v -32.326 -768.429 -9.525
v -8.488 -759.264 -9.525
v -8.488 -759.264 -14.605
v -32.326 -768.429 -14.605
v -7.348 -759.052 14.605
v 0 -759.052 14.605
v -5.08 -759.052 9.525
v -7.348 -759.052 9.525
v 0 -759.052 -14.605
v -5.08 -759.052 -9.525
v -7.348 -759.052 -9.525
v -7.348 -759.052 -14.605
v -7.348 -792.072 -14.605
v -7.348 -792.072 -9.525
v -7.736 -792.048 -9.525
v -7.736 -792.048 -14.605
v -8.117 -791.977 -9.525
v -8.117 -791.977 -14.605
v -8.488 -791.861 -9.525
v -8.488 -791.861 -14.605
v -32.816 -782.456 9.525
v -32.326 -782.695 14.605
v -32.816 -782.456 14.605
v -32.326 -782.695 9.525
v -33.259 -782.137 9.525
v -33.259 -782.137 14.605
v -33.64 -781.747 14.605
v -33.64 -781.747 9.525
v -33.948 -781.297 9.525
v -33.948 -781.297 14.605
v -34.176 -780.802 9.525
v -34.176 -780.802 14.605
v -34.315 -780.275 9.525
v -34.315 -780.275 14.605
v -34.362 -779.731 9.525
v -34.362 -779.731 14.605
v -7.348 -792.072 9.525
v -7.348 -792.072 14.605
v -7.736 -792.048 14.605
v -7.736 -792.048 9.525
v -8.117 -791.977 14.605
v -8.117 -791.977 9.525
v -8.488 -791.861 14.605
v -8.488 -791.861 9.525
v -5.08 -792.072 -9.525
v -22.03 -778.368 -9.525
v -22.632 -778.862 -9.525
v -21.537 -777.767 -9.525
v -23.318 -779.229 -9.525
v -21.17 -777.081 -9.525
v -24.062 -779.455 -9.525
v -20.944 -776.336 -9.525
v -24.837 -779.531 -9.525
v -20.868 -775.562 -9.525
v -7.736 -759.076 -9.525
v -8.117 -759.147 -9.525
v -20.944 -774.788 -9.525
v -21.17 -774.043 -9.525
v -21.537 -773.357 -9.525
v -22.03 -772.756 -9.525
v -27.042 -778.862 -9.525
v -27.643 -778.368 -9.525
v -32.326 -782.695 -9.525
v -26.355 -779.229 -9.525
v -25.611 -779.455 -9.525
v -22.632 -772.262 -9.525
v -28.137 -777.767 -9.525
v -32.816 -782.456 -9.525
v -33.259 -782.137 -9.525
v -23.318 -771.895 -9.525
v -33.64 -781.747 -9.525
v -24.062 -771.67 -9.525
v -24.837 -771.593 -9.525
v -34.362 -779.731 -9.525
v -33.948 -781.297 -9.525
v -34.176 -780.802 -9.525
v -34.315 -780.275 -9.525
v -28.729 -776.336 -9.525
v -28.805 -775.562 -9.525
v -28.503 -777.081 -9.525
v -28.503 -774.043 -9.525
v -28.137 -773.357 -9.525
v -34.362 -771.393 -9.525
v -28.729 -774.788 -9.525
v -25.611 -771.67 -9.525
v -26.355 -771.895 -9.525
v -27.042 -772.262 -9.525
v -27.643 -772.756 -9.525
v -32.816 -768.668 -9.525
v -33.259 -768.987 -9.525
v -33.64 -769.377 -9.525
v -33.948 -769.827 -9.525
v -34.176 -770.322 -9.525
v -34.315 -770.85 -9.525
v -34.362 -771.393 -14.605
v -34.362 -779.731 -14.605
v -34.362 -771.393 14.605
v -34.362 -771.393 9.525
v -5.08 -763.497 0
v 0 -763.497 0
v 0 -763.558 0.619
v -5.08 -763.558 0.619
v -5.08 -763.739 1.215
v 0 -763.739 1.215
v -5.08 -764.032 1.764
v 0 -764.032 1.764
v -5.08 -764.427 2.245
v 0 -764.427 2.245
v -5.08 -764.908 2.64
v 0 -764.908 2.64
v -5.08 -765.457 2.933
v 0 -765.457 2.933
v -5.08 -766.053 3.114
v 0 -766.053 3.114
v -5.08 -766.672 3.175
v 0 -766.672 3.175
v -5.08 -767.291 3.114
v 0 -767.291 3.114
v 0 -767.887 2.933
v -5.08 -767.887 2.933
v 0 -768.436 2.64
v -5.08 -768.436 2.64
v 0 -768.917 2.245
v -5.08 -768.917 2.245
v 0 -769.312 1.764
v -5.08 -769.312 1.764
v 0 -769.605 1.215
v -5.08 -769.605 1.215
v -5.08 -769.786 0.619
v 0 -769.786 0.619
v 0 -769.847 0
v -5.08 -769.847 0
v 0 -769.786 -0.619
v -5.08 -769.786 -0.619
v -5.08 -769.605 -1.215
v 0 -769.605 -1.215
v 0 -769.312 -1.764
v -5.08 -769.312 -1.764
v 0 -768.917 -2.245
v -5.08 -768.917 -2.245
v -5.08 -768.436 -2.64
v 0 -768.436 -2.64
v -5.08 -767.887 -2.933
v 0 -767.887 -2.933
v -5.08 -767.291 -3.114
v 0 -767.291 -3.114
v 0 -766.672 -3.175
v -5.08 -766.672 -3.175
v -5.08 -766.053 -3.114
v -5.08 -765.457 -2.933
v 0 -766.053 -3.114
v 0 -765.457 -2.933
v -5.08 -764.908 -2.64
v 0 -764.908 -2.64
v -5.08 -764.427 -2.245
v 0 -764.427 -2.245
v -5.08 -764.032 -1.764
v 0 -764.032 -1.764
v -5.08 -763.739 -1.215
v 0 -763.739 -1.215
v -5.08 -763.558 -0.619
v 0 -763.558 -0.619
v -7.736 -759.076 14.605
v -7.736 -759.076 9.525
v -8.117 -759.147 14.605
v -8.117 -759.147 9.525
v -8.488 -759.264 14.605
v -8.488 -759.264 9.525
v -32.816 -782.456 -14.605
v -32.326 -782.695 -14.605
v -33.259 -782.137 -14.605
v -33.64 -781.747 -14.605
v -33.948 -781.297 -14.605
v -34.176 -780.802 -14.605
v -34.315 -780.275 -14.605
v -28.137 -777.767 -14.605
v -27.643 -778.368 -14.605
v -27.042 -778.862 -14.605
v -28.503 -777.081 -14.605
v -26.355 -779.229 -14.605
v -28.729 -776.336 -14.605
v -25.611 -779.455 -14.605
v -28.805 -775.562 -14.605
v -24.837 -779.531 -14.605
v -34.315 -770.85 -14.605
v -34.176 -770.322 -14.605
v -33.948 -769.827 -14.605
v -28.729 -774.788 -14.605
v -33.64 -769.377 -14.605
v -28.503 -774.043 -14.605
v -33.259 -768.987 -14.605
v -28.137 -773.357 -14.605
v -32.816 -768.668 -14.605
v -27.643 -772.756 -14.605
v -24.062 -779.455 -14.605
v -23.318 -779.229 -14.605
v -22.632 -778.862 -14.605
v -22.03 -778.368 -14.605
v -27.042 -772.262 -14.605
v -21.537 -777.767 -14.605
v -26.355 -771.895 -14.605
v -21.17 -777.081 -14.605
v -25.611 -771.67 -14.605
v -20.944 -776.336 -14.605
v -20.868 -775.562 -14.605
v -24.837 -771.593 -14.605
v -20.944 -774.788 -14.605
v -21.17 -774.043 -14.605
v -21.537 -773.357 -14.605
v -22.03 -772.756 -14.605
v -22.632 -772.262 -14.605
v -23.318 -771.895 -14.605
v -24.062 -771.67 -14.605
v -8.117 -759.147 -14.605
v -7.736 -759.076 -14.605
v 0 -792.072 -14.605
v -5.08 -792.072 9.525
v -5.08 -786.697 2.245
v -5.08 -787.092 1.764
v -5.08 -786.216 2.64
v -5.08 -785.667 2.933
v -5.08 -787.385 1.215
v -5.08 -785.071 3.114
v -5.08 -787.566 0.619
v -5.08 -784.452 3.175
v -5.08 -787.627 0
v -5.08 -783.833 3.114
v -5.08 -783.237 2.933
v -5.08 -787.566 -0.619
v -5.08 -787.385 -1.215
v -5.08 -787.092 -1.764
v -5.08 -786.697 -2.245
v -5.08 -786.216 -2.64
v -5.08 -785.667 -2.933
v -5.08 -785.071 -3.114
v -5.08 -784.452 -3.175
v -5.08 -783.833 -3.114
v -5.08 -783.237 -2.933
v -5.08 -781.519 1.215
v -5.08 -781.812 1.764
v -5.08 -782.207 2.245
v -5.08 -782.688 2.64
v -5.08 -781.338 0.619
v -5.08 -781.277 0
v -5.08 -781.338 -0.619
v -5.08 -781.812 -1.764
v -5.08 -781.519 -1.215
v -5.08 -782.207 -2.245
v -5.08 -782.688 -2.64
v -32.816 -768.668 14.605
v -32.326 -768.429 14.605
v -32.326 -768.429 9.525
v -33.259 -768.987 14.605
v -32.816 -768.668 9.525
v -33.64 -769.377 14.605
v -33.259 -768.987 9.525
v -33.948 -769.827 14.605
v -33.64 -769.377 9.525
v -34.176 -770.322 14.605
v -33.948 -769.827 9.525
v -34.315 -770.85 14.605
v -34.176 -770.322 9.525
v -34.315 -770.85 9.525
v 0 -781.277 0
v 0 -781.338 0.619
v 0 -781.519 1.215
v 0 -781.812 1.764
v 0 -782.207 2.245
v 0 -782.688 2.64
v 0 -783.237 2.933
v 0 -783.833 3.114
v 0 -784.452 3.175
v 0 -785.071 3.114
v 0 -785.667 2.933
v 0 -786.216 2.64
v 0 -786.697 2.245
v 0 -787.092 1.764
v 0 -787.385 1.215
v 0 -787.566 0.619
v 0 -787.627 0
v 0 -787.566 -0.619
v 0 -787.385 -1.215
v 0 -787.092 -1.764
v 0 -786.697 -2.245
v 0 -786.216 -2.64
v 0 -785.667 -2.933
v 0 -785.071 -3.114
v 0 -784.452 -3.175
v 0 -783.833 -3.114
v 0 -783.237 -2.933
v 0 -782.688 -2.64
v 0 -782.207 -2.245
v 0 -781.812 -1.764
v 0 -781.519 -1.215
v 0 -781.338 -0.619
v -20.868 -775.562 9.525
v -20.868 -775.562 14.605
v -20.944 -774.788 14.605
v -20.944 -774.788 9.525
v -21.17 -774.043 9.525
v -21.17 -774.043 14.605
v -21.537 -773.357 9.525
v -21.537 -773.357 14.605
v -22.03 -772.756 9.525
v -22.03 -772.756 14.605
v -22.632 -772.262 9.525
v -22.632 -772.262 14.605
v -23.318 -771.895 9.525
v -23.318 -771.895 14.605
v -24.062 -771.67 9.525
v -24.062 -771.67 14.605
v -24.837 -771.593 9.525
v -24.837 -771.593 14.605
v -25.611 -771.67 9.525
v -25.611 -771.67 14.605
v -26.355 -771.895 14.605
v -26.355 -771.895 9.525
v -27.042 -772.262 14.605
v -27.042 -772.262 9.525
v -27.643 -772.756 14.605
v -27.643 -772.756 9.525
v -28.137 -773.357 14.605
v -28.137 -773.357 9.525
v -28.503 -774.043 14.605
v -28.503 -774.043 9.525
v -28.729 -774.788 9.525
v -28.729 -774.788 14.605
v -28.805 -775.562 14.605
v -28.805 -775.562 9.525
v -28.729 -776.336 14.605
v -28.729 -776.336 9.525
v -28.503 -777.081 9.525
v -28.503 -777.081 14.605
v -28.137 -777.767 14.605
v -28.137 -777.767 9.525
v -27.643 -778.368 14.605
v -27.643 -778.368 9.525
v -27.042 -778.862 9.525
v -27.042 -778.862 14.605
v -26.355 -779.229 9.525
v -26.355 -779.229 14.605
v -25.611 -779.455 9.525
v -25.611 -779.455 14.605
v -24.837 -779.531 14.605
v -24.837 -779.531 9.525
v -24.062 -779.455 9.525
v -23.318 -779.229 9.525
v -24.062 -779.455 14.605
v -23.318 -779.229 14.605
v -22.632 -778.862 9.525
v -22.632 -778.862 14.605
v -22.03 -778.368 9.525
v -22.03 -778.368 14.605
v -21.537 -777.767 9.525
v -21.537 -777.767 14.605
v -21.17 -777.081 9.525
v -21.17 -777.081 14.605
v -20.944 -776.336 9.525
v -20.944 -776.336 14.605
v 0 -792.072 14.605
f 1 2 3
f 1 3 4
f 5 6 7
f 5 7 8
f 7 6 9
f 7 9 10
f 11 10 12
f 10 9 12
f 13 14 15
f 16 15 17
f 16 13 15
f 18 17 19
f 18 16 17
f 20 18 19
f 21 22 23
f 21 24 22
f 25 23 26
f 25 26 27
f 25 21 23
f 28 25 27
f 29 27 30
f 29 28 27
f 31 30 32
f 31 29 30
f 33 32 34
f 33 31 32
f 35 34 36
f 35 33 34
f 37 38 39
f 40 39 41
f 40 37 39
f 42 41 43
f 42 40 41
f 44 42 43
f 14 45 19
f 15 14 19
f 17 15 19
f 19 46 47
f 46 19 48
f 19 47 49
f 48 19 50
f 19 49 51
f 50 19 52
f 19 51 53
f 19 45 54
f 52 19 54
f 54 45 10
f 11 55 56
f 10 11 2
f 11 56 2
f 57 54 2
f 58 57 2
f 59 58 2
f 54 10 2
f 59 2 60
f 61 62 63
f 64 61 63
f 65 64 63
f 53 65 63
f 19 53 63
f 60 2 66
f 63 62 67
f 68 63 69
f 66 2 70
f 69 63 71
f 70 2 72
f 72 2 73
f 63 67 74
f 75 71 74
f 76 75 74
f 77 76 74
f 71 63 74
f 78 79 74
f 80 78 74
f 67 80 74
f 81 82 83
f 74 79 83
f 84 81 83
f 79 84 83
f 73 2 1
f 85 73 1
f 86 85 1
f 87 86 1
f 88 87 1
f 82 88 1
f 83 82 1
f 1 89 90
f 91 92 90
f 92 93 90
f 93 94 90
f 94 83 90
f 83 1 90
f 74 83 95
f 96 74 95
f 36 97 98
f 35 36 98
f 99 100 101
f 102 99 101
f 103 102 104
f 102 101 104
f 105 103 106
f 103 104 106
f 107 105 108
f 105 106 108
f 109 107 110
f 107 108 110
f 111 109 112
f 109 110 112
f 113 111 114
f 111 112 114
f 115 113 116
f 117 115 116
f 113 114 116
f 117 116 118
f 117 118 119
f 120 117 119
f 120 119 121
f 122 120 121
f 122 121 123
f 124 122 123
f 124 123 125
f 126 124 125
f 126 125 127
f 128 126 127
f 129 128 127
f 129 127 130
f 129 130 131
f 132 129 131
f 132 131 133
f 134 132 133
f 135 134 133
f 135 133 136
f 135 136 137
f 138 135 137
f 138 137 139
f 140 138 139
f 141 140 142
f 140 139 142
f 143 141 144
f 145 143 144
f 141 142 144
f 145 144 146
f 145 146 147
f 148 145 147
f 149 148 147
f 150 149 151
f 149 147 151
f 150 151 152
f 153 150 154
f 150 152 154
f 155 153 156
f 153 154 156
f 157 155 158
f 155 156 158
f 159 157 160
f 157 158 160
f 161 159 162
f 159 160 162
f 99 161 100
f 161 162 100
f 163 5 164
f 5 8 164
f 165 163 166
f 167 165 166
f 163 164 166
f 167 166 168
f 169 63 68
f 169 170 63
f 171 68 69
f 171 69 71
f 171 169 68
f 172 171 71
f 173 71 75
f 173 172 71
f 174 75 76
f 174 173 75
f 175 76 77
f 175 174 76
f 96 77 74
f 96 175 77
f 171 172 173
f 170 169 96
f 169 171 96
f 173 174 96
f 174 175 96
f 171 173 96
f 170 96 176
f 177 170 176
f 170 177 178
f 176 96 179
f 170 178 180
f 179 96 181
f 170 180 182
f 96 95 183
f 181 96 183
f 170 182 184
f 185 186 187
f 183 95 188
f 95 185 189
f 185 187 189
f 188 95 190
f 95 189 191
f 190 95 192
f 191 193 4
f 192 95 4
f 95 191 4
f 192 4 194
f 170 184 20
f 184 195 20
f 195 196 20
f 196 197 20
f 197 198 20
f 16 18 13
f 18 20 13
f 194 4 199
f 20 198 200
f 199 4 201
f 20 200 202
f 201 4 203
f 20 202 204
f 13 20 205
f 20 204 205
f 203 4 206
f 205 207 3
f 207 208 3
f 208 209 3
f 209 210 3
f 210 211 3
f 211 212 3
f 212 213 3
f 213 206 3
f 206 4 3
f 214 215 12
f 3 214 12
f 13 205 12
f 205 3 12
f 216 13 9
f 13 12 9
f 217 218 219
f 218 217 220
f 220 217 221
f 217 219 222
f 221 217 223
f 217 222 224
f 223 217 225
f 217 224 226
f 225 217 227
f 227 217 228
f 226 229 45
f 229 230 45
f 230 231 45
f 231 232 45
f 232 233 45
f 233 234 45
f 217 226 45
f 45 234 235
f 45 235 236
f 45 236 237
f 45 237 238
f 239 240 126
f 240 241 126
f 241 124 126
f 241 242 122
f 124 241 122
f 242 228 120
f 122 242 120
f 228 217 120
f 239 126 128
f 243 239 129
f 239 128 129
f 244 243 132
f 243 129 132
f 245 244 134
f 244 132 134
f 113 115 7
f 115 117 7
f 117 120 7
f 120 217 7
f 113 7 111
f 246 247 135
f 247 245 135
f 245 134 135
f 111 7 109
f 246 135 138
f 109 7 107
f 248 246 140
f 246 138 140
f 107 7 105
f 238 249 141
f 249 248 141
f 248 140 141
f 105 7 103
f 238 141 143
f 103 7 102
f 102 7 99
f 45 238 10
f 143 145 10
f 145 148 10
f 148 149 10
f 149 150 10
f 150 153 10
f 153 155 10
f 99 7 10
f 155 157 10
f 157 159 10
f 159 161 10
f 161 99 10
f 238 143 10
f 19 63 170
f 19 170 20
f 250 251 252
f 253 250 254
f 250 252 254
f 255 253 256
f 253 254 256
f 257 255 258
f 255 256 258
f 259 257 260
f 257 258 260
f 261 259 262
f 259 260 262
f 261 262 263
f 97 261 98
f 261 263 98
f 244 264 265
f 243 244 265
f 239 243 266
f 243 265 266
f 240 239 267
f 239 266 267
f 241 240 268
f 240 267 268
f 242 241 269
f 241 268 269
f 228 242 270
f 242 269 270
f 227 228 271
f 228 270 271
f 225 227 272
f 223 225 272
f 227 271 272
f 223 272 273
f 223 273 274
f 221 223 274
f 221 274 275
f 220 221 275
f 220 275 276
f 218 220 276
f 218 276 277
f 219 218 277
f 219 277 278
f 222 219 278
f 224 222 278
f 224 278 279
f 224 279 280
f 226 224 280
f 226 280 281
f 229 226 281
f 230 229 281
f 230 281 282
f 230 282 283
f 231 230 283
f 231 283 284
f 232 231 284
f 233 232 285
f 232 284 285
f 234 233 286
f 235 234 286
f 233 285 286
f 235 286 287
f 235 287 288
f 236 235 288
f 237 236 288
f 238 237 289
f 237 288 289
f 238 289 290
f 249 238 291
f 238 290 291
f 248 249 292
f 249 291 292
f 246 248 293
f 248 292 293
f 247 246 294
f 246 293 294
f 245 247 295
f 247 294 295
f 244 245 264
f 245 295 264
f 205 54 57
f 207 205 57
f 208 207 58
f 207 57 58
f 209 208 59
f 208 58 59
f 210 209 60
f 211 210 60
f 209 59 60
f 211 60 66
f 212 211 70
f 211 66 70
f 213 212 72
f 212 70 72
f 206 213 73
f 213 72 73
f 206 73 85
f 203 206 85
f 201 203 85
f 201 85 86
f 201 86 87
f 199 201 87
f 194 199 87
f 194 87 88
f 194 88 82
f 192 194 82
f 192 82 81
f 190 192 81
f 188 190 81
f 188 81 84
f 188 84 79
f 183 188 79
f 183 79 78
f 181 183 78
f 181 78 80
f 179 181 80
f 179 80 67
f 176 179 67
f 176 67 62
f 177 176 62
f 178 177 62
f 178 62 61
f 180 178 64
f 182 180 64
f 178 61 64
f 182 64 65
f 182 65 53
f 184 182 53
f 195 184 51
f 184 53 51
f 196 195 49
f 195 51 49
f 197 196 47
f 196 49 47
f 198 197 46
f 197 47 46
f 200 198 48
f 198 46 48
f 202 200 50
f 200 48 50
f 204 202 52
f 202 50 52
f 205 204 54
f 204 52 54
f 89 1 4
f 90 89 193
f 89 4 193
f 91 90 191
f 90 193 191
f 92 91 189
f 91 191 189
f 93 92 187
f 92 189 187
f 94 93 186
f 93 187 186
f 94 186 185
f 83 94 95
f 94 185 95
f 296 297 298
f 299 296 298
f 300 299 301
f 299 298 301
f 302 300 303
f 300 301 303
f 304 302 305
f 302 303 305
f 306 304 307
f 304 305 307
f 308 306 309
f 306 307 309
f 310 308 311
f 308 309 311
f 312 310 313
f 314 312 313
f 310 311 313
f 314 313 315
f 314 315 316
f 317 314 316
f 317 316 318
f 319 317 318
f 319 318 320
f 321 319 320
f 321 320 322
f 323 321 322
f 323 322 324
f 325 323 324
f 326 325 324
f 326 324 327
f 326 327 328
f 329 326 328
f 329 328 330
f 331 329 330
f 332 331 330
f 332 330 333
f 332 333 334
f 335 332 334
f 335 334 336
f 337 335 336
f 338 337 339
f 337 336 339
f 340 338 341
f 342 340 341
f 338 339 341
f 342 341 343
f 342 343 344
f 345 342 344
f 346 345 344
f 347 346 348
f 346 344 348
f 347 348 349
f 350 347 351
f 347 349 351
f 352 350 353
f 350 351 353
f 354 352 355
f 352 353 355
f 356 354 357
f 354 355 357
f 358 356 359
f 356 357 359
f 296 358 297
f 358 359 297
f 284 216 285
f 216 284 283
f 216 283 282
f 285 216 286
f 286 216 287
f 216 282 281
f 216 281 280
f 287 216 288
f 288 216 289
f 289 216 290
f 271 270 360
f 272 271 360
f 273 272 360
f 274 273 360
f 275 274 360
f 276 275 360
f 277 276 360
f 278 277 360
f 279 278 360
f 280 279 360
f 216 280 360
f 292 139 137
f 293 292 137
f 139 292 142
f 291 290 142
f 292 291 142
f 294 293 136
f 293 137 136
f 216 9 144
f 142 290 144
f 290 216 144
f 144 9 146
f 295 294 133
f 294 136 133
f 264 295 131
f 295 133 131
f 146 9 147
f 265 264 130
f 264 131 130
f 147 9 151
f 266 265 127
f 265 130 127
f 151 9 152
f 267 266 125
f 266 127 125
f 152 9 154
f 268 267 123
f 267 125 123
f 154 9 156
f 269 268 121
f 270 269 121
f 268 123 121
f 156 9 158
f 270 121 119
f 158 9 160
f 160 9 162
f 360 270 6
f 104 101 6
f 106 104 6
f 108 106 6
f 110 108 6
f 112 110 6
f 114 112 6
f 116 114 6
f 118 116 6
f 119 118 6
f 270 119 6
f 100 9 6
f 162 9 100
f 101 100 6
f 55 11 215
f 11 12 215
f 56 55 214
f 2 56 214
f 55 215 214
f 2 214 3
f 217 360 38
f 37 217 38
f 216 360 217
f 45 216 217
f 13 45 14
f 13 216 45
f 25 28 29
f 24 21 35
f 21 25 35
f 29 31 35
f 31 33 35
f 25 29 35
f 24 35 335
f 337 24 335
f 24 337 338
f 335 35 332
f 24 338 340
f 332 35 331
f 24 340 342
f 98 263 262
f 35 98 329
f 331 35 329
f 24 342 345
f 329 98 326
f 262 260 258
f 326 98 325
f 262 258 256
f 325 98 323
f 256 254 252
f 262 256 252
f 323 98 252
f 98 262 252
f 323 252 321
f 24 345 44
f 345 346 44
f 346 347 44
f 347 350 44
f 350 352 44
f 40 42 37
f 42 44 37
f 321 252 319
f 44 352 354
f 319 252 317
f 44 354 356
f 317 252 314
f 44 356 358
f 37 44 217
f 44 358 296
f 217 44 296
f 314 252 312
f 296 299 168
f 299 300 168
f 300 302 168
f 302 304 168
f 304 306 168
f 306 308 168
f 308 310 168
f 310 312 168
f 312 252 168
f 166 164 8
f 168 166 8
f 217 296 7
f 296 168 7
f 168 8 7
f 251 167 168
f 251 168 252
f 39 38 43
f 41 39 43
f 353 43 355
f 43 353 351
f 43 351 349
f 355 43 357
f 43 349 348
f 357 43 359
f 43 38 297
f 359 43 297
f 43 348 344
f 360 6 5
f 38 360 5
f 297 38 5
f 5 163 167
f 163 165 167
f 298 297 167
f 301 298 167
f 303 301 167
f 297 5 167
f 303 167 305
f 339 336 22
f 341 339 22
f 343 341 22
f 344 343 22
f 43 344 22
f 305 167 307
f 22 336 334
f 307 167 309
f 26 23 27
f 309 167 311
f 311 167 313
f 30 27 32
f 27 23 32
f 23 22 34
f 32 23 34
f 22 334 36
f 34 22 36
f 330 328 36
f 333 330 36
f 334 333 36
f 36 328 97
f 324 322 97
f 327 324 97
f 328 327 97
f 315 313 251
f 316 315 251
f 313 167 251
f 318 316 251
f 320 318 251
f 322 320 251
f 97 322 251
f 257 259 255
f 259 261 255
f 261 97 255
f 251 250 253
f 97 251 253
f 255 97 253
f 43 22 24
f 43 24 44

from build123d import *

# Parameters (mm, degrees)
BOSS_EXTRUDE1_DEPTH = 33.02
CUT_EXTRUDE1_REACH  = 794.952
SKETCH2_R           = 3.175
SKETCH3_R           = 3.96875
CUT_EXTRUDE2_DEPTH  = 794.354962335
FILLET1_R           = 3.175


with BuildPart() as part:
    # Sketch1 → Boss-Extrude1 (new body)
    with BuildSketch(Plane(origin=(0, -759.052062329, 0), x_dir=(-1, 0, 0), z_dir=(0, -1, 0))):
        Polygon((0, 14.605), (0, -14.605), (34.361609966, -14.605), (34.361609966, -9.525), (5.08, -9.525), (5.08, 9.525), (34.361609966, 9.525), (34.361609966, 14.605), align=None)
    extrude(amount=BOSS_EXTRUDE1_DEPTH)

    # Sketch2 → Cut-Extrude1 (cut, up to next)
    with BuildSketch(Plane(origin=(0, 0, 0), x_dir=(0, 0, -1), z_dir=(1, 0, 0)), mode=Mode.PRIVATE) as cut_extrude1_sk1:
        with Locations(Location((0, -784.452062329, 0), (0, 0, 90))):
            Circle(SKETCH2_R)
    cut_extrude1_tool1 = extrude(cut_extrude1_sk1.sketch, amount=-CUT_EXTRUDE1_REACH, mode=Mode.PRIVATE) & part.part
    # Sketch2 → Cut-Extrude1 (cut, up to next)
    with BuildSketch(Plane(origin=(0, 0, 0), x_dir=(0, 0, -1), z_dir=(1, 0, 0)), mode=Mode.PRIVATE) as cut_extrude1_sk2:
        with Locations(Location((0, -766.672062329, 0), (0, 0, 90))):
            Circle(SKETCH2_R)
    cut_extrude1_tool2 = extrude(cut_extrude1_sk2.sketch, amount=-CUT_EXTRUDE1_REACH, mode=Mode.PRIVATE) & part.part
    add(cut_extrude1_tool1.solids().sort_by_distance((0, -784.452062, 0))[0], mode=Mode.SUBTRACT)
    add(cut_extrude1_tool2.solids().sort_by_distance((0, -766.672062, 0))[0], mode=Mode.SUBTRACT)

    # Sketch3 → Cut-Extrude2 (cut, through all)
    with BuildSketch(Plane.XY.offset(14.605)):
        with Locations((-24.836609966, -775.562062329)):
            Circle(SKETCH3_R)
        Polygon((-7.9375, -759.052062329), (-34.361609966, -769.212062329), (-34.361609966, -759.052062329), align=None)
        Polygon((-34.361609966, -792.072062329), (-34.361609966, -781.912062329), (-7.9375, -792.072062329), align=None)
    extrude(amount=-CUT_EXTRUDE2_DEPTH, mode=Mode.SUBTRACT)

    # Fillet1
    fillet1_edges = [part.edges().sort_by_distance(p)[0] for p in [
        (-7.9375, -759.052062329, 12.065),
        (-7.9375, -792.072062329, 12.065),
        (-34.361609966, -781.912062329, 12.065),
        (-7.9375, -792.072062329, -12.065),
        (-34.361609966, -781.912062329, -12.065),
        (-34.361609966, -769.212062329, 12.065),
        (-7.9375, -759.052062329, -12.065),
        (-34.361609966, -769.212062329, -12.065),
    ]]
    fillet(fillet1_edges, radius=FILLET1_R)


solid = part.part
